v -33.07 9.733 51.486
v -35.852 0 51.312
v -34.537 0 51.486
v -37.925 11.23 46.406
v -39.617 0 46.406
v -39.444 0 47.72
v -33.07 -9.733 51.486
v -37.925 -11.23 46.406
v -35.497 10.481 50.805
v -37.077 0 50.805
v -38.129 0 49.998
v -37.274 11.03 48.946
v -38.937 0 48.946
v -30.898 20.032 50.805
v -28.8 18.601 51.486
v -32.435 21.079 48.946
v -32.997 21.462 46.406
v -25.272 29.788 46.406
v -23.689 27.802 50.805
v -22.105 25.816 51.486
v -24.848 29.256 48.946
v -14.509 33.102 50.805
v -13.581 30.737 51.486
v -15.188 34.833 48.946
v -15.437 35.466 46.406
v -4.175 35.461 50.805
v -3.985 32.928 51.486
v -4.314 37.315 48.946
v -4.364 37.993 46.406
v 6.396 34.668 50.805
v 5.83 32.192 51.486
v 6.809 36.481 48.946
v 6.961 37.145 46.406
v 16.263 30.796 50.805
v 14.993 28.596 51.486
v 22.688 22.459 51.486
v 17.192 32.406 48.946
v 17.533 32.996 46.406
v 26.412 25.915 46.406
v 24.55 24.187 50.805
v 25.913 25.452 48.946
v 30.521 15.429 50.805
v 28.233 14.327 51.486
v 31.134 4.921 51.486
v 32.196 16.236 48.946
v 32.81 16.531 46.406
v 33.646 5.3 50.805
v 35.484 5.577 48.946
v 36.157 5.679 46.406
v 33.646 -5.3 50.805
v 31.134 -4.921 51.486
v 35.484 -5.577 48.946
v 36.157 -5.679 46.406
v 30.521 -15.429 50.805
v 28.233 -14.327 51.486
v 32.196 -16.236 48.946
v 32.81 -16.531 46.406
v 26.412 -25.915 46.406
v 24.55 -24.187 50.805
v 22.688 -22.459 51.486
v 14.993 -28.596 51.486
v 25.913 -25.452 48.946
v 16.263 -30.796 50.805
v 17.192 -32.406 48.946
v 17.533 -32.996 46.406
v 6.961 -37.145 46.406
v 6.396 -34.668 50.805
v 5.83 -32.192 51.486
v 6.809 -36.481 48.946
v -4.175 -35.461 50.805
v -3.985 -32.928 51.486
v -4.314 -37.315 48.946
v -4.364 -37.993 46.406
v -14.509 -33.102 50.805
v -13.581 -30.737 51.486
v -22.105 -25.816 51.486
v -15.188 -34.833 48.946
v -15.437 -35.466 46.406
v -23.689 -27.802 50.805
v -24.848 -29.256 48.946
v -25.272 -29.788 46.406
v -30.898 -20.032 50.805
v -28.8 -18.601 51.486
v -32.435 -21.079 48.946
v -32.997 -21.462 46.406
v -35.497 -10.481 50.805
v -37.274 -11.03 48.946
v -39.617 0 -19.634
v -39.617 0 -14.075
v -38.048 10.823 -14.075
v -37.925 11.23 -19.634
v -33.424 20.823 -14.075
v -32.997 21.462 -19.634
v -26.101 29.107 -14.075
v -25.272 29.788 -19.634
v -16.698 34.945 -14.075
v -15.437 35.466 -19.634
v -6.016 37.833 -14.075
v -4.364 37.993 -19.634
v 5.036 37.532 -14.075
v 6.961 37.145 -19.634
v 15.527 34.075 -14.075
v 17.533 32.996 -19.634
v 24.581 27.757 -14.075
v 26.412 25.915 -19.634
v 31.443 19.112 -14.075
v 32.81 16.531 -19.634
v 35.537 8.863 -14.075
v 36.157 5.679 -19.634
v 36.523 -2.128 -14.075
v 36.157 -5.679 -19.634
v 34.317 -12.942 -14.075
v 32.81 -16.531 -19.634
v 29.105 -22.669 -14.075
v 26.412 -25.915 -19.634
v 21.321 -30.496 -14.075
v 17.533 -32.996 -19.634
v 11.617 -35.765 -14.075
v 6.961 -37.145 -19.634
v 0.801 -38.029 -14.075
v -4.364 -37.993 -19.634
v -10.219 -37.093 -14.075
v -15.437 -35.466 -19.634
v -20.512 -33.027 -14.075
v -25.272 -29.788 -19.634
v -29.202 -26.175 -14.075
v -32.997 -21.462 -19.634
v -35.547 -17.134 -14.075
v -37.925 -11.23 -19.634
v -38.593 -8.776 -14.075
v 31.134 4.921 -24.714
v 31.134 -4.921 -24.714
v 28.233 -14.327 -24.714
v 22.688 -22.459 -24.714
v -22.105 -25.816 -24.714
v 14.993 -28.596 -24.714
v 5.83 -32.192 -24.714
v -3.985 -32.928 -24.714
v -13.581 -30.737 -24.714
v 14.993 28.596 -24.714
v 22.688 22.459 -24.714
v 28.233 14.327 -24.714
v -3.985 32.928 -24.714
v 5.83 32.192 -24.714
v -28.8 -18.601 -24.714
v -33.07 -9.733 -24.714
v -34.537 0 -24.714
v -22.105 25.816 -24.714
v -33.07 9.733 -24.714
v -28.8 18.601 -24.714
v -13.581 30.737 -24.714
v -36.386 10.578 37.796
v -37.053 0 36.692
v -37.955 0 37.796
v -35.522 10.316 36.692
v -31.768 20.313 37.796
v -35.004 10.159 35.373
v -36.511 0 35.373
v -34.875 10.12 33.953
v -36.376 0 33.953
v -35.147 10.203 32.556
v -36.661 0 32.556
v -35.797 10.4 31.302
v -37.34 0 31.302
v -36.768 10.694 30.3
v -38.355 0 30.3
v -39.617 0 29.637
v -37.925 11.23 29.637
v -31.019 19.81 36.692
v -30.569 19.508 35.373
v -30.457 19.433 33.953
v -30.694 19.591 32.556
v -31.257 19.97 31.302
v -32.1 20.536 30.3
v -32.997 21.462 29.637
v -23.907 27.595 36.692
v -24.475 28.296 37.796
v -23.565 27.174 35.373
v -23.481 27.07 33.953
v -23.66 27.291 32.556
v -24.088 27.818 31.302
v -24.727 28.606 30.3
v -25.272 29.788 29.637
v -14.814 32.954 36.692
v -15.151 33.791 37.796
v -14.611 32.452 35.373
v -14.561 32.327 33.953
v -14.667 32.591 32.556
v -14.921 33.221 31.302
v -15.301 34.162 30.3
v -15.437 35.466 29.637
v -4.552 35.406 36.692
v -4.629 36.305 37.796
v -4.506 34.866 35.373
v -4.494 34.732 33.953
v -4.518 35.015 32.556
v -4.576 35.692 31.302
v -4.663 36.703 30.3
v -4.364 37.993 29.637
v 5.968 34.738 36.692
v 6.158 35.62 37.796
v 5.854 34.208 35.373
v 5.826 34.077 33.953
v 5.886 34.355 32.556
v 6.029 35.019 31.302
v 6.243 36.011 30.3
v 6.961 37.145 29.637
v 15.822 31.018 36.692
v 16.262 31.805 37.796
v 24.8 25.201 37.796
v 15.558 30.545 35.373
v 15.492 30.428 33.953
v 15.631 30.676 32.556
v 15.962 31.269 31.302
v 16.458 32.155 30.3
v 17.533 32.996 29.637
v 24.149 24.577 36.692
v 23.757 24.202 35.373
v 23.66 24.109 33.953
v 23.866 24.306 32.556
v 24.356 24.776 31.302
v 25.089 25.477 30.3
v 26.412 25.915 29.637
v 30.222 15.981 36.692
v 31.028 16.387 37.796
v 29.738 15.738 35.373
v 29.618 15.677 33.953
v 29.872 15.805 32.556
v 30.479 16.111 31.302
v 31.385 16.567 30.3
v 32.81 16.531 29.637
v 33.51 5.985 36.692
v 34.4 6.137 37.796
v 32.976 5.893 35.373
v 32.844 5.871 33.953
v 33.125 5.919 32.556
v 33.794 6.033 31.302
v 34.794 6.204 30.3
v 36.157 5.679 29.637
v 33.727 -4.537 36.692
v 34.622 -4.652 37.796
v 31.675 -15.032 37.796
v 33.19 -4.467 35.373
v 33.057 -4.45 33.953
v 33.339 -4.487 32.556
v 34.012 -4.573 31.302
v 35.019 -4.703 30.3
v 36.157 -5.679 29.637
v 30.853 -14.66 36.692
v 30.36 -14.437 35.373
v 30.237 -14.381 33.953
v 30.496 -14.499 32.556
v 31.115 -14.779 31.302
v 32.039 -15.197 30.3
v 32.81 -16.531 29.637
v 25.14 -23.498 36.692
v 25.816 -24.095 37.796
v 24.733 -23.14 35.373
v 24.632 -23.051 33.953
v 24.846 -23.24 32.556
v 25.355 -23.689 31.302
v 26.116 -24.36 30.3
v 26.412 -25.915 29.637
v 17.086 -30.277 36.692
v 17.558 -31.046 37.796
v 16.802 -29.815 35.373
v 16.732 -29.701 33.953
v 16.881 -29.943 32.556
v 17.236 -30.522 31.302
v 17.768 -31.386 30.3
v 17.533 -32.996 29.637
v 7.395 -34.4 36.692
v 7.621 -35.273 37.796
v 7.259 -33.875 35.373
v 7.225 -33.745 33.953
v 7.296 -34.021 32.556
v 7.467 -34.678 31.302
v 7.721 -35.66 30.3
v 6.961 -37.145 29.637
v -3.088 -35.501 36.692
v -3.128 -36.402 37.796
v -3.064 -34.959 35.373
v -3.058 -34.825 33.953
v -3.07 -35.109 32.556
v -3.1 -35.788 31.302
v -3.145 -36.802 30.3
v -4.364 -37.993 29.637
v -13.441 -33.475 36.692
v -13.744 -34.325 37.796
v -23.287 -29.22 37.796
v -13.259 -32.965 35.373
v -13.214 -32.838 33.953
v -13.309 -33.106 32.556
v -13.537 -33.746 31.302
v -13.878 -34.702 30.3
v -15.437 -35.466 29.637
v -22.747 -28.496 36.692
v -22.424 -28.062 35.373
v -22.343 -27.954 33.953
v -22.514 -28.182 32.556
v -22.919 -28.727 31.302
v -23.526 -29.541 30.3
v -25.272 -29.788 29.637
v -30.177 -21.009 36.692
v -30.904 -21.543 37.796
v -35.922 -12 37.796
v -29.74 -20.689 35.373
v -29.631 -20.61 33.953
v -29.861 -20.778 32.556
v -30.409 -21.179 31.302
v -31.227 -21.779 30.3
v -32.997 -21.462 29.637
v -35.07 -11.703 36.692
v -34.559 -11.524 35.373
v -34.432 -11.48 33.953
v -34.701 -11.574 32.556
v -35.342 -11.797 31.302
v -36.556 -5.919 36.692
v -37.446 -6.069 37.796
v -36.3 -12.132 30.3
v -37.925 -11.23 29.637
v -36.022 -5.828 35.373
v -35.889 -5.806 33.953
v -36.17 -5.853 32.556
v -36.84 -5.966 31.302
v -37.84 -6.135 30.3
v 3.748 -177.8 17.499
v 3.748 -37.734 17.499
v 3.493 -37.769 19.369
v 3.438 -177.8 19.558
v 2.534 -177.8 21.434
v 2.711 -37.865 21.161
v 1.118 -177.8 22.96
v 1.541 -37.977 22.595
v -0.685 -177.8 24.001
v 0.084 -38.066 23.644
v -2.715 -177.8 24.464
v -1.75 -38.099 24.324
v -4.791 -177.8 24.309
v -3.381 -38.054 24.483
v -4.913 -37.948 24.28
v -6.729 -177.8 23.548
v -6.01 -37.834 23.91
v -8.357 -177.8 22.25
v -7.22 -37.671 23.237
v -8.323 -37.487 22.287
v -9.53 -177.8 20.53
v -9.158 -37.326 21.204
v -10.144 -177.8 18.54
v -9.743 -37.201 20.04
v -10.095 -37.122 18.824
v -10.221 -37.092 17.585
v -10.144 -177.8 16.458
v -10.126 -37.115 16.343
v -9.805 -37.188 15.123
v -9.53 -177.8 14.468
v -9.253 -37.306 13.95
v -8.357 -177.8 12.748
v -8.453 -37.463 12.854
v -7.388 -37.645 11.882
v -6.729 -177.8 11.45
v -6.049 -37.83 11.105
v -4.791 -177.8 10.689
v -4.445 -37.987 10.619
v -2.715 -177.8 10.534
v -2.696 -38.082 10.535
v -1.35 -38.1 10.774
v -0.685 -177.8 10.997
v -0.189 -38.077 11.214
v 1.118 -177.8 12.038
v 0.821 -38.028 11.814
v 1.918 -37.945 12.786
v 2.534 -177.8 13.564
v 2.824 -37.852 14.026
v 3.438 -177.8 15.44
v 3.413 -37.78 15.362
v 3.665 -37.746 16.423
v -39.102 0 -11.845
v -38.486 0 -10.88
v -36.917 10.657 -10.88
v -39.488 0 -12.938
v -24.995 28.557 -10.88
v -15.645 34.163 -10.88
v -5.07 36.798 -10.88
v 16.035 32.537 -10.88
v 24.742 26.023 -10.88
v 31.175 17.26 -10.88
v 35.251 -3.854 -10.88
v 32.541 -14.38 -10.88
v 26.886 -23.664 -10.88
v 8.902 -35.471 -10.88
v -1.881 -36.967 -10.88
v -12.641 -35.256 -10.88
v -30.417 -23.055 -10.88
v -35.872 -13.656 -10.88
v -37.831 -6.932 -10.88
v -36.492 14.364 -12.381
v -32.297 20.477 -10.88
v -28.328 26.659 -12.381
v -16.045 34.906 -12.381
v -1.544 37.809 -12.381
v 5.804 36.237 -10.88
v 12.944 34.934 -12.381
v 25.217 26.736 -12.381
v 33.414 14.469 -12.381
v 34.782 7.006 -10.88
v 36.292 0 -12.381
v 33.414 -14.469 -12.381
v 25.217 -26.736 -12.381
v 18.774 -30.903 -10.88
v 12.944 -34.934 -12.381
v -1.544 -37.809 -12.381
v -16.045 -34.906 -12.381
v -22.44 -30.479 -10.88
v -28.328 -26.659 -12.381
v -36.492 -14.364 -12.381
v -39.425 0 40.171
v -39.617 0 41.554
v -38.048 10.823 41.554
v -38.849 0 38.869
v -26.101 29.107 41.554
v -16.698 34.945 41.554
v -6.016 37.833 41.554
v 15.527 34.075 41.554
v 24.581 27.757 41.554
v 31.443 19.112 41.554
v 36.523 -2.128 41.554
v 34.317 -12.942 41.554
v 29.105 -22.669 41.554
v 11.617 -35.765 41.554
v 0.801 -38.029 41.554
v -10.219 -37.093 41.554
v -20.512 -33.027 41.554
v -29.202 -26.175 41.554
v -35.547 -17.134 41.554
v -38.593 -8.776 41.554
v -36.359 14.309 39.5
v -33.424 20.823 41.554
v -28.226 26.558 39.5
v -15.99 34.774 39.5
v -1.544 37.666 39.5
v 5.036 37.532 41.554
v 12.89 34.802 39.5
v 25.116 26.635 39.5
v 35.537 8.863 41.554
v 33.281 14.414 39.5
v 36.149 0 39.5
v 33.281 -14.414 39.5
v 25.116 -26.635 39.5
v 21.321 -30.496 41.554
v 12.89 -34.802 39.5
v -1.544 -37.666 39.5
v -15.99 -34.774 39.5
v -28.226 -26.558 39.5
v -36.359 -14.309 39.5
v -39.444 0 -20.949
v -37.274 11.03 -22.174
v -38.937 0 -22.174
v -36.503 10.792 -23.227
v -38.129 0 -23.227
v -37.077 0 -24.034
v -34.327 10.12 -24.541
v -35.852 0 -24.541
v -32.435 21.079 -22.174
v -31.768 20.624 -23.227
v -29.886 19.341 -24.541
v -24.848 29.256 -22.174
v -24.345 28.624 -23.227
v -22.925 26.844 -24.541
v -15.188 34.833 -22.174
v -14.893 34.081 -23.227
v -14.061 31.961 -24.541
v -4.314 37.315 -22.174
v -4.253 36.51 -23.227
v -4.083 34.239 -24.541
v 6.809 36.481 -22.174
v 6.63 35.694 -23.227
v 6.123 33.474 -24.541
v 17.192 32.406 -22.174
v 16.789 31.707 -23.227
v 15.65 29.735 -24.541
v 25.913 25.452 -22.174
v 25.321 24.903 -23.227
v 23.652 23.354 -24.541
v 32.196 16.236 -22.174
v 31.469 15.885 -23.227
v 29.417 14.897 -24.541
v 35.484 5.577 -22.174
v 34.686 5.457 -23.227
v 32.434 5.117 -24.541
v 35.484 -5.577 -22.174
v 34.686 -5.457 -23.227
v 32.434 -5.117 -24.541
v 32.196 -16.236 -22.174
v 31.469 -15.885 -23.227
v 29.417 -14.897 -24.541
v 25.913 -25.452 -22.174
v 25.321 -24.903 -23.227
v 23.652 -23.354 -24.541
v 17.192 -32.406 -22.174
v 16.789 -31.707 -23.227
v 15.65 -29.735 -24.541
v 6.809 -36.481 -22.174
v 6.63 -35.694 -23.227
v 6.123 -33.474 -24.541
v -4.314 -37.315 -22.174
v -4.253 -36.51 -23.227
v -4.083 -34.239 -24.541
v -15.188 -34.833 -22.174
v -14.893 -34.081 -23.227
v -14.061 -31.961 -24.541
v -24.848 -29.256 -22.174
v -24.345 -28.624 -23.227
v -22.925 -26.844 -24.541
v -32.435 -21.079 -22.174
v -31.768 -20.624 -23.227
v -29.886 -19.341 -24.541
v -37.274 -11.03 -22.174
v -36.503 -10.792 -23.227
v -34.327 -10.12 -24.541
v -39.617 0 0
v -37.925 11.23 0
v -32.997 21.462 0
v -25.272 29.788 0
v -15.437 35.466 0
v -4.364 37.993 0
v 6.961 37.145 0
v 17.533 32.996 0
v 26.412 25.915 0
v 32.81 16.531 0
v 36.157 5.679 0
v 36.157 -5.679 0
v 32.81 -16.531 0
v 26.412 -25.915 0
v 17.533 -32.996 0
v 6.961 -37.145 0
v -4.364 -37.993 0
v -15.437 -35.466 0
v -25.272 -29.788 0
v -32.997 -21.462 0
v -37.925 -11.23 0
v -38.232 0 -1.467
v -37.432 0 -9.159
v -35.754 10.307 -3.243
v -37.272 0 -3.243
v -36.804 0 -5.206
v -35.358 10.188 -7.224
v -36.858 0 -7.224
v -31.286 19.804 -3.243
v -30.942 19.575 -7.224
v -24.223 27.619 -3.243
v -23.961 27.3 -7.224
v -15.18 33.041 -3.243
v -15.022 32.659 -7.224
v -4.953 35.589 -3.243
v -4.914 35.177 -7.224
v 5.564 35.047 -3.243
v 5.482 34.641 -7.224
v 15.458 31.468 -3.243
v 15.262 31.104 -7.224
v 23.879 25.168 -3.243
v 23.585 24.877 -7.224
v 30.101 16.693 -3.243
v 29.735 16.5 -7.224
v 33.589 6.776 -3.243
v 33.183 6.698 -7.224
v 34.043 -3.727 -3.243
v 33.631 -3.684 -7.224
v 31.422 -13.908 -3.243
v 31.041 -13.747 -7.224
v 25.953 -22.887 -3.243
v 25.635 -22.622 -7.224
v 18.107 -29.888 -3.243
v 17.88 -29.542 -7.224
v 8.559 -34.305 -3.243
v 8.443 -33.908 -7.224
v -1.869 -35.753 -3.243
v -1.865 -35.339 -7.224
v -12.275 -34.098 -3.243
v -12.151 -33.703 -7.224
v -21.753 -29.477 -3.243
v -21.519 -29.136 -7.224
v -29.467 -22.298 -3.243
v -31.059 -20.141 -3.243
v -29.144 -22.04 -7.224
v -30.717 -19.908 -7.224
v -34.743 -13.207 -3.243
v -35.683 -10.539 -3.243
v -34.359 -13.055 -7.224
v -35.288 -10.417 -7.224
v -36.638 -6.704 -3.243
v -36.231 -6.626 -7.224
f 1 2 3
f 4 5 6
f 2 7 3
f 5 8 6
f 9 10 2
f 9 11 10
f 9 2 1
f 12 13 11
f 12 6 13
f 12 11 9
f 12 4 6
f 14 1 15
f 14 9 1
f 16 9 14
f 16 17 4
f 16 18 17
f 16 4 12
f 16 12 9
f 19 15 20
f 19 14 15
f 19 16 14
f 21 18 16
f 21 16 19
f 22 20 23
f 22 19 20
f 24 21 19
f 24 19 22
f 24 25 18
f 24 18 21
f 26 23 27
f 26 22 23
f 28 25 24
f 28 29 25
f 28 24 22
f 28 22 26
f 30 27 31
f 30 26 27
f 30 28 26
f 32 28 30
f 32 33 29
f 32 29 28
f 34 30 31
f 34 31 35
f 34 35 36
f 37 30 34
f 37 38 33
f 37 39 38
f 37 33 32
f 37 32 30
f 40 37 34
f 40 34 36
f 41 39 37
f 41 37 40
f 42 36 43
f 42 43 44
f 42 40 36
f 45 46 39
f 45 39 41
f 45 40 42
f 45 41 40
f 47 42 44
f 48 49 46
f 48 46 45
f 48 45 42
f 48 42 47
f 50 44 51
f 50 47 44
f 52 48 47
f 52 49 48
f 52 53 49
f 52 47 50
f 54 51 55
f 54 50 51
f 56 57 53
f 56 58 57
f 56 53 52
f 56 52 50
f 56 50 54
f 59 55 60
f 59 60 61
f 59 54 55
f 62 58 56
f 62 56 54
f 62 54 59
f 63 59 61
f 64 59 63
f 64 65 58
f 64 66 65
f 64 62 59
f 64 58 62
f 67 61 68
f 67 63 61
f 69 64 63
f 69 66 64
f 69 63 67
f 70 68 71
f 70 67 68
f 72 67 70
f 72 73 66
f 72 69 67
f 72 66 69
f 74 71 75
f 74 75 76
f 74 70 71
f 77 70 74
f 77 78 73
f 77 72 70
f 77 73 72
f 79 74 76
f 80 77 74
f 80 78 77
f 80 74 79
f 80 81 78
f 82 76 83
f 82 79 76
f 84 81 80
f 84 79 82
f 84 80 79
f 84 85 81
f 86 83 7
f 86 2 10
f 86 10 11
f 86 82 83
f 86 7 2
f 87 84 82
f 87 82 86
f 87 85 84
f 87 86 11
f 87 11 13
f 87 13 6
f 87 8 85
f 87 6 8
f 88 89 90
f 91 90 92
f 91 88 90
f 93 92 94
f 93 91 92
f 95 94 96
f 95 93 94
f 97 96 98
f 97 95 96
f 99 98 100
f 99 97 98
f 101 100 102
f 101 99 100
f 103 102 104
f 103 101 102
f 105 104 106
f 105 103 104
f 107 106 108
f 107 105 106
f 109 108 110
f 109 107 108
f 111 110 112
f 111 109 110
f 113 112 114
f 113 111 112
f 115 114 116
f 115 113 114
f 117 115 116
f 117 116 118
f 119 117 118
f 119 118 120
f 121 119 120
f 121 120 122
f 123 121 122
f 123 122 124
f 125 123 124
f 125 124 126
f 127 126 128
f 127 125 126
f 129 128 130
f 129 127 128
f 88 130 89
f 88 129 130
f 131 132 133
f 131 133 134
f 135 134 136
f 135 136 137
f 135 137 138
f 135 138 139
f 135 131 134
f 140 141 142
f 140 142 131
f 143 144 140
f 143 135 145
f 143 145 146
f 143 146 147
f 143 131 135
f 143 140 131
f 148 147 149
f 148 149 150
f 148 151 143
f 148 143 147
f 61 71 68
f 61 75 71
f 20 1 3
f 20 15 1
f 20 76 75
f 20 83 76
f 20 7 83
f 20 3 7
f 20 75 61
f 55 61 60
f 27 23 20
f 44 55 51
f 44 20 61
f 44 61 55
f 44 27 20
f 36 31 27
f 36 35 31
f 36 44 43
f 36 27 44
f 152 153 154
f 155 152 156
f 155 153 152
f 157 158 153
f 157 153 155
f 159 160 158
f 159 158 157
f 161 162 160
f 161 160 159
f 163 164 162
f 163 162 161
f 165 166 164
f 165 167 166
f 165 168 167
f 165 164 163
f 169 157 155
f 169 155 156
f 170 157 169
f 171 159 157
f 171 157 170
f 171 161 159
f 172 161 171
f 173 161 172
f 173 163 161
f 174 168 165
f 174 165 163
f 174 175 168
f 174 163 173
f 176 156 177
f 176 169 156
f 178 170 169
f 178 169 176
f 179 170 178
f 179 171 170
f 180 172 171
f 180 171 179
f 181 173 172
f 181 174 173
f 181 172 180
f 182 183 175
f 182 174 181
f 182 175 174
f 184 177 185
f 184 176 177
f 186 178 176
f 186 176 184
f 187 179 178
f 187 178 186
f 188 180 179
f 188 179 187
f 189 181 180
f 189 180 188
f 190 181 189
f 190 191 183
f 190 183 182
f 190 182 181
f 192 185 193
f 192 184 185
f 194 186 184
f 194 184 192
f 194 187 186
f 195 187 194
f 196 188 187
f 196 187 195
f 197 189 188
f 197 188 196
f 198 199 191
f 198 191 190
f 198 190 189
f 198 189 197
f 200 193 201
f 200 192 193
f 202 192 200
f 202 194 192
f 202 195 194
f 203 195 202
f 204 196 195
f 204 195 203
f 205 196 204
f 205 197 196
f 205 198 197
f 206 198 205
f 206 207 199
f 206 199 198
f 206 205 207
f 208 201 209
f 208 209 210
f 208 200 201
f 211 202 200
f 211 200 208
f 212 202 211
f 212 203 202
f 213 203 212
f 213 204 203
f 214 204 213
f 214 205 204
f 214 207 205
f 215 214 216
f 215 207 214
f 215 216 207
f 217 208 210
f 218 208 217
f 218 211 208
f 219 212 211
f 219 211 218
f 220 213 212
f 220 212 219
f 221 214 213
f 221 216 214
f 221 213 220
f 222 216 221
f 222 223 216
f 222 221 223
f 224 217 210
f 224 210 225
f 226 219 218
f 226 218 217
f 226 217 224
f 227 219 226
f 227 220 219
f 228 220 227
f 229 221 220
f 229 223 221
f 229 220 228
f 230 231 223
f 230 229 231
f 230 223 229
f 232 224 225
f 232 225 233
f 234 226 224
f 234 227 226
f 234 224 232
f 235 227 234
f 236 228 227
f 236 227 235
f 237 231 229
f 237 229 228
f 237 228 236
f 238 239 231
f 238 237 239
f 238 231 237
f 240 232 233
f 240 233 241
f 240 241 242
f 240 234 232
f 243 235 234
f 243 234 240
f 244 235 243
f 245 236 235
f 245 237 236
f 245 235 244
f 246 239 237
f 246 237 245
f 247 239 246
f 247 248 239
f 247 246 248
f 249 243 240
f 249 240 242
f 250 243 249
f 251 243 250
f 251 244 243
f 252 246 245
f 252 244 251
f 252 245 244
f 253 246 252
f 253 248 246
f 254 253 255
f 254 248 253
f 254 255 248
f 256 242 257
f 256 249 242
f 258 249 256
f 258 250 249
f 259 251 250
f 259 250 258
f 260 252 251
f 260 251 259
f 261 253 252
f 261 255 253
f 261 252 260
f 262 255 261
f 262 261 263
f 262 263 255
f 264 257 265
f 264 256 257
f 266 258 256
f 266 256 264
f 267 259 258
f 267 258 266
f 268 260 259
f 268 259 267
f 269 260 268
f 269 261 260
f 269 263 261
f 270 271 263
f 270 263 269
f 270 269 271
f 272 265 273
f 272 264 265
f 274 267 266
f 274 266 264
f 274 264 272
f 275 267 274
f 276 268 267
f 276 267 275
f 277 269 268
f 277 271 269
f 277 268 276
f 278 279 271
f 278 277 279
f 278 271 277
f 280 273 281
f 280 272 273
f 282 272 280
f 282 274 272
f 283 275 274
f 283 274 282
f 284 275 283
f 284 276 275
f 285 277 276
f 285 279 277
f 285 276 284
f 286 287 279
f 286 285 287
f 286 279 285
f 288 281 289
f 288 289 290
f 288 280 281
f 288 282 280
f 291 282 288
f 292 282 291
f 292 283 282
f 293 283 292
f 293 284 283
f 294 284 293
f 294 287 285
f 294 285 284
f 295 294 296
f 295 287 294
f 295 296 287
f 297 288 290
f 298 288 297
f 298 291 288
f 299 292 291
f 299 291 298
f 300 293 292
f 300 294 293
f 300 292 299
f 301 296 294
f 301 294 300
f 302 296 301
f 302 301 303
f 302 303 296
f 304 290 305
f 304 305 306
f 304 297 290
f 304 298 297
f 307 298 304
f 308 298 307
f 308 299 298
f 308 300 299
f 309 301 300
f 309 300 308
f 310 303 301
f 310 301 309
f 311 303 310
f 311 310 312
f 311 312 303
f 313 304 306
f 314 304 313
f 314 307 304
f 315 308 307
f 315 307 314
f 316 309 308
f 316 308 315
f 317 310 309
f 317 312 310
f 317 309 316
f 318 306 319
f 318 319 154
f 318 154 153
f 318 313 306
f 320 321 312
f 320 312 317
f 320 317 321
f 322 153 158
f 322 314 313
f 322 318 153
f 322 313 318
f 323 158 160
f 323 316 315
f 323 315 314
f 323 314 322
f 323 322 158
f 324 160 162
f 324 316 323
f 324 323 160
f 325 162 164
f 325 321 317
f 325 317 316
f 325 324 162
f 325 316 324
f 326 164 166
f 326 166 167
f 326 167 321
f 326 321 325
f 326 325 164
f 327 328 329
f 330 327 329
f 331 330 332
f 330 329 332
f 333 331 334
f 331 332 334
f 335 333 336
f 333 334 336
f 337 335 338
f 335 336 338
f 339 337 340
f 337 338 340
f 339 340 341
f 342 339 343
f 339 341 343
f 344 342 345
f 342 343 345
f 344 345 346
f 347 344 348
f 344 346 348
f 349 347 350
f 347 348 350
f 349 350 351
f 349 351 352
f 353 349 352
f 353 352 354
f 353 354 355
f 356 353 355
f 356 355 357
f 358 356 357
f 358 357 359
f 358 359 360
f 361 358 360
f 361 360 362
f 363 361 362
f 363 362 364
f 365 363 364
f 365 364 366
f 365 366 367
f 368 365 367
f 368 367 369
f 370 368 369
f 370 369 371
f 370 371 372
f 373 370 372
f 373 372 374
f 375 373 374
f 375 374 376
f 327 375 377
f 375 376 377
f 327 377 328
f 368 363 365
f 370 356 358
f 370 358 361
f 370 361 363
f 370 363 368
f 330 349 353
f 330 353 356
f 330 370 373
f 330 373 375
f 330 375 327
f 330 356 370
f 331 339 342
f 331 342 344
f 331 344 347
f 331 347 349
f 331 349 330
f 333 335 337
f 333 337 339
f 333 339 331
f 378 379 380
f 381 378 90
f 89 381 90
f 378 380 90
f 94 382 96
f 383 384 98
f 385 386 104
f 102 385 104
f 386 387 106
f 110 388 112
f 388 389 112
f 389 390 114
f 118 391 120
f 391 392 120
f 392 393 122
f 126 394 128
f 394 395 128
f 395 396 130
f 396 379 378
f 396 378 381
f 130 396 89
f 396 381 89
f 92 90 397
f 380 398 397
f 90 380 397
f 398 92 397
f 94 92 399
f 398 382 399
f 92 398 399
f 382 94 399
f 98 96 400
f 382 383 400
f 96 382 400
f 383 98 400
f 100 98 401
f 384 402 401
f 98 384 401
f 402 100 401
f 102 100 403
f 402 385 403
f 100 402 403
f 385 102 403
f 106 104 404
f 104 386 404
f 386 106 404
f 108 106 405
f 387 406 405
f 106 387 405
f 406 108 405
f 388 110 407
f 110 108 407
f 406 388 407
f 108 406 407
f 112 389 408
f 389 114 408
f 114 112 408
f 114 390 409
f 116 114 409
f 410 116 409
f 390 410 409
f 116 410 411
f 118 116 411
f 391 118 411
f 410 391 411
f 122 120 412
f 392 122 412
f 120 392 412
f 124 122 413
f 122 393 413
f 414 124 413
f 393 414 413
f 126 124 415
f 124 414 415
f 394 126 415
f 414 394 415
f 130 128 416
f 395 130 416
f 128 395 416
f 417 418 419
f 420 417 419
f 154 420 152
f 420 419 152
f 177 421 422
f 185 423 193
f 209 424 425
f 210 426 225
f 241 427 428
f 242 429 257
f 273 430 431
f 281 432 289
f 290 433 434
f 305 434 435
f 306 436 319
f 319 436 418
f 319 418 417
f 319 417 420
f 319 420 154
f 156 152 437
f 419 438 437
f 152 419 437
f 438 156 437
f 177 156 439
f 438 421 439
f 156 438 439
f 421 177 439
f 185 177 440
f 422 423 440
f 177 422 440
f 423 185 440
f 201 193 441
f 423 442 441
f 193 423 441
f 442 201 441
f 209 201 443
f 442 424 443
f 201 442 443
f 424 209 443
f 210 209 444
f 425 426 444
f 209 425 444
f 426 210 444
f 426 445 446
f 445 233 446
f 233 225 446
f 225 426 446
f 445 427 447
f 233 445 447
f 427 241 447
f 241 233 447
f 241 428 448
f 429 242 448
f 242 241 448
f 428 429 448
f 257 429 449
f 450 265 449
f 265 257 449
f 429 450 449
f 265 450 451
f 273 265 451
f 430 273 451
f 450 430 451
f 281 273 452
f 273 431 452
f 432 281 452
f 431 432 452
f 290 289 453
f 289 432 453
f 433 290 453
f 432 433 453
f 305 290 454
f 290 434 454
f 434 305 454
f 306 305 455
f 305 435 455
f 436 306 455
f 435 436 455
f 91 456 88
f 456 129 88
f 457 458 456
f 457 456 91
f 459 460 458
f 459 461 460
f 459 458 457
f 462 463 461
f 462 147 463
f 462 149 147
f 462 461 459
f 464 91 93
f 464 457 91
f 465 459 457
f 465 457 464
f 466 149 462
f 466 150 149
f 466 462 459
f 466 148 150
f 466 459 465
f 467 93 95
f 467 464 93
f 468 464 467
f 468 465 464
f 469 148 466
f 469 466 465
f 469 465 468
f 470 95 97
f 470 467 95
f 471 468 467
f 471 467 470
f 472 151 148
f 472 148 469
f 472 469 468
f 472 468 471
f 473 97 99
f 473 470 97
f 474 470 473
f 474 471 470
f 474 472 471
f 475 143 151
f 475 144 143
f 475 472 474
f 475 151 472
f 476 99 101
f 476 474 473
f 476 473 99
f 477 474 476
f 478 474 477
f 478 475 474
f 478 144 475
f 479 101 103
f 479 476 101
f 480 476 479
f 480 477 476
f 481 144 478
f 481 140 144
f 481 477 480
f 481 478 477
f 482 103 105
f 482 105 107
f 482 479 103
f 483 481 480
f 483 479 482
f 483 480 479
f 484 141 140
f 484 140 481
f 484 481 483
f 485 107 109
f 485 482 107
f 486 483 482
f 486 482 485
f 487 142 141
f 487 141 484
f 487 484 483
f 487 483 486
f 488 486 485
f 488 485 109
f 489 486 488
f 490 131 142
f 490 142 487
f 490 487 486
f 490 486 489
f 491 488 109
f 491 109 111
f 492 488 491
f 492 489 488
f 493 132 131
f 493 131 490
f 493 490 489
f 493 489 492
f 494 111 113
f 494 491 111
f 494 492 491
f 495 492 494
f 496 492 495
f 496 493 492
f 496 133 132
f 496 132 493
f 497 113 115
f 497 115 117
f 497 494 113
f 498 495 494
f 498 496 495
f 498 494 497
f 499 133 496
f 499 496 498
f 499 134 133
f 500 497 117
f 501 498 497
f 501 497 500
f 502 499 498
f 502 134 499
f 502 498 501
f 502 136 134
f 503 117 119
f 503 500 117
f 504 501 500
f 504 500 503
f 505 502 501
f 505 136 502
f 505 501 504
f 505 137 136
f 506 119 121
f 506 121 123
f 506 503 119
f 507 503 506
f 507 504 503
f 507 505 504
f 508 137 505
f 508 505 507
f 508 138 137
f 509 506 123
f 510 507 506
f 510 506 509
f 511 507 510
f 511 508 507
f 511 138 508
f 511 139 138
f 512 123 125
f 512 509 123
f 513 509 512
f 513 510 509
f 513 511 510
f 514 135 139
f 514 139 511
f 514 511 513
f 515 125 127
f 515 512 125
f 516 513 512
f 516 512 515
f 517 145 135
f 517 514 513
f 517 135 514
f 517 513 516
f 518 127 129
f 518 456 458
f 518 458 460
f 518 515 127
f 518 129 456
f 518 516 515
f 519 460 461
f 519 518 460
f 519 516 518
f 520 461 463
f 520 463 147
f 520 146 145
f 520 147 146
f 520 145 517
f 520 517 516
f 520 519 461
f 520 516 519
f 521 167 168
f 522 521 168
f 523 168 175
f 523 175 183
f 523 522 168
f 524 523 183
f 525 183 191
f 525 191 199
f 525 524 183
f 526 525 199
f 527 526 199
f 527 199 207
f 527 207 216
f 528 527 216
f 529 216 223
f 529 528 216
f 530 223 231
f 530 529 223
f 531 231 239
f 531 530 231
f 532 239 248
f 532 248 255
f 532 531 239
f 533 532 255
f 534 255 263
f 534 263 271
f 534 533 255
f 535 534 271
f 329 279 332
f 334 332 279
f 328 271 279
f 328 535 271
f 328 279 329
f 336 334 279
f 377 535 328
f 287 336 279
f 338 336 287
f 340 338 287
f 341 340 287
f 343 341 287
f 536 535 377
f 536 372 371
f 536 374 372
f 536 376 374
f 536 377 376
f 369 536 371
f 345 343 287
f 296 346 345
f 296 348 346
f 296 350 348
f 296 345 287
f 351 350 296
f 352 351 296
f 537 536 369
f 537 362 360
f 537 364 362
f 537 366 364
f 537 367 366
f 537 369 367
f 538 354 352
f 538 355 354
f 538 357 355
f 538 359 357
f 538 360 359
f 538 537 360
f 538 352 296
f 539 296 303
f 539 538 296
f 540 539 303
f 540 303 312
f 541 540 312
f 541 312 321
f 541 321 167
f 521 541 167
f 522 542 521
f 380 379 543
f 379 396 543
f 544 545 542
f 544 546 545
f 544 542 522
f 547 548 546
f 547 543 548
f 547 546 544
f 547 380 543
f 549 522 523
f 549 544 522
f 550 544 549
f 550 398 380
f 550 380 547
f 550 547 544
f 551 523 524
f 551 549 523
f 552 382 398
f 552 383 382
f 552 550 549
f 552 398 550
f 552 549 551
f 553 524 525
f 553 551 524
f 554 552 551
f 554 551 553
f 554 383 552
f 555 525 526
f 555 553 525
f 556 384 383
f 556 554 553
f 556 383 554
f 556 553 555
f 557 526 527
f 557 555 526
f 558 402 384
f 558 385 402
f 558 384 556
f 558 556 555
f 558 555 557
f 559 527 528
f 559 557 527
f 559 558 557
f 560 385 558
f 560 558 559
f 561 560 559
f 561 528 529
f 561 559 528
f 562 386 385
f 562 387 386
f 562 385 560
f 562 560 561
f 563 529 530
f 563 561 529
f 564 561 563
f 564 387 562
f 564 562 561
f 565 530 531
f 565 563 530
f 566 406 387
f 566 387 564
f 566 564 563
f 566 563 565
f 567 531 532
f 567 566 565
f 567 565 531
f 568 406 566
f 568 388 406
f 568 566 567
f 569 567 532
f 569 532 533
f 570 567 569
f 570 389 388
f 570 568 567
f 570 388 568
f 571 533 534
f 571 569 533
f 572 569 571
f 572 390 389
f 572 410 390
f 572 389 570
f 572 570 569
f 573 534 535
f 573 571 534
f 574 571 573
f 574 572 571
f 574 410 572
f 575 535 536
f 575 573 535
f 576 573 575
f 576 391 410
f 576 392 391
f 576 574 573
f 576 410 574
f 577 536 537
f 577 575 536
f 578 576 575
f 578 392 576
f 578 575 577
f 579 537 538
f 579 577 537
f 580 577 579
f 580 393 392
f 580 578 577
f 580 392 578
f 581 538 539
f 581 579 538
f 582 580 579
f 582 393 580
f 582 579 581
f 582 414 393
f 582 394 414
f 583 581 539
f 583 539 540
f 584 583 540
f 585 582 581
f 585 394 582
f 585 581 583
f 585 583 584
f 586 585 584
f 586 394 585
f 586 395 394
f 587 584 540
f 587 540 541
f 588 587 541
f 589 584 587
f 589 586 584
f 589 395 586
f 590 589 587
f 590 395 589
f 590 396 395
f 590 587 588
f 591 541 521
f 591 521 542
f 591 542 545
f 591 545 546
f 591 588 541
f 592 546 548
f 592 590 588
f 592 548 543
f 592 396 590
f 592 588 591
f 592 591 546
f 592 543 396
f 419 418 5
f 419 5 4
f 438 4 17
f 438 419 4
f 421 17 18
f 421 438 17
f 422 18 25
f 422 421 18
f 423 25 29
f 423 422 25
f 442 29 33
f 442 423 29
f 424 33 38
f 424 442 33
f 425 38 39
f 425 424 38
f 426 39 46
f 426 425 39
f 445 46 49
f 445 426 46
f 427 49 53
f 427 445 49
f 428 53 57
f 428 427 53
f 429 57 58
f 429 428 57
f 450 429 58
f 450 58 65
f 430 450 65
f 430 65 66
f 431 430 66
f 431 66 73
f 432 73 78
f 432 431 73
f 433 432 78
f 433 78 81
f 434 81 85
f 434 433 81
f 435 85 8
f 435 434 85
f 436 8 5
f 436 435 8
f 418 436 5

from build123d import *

# Parameters (mm, degrees)
F2_R     = 5.08
F3_R     = 6.985
F4_DEPTH = 177.8


with BuildPart() as f1:
    # F0 (on Front) → F1 (revolve)
    with BuildSketch(Plane.XZ):
        with BuildLine():
            Line((-1.5172553301, 51.4855757356), (-39.6172553301, 51.4855757356))
            Line((-39.6172553301, 51.4855757356), (-39.6172553301, 38.7855757356))
            ThreePointArc((-39.6172553301, 38.7855757356), (-36.369468827, 34.2113286421), (-39.6172553301, 29.6370815486))
            Line((-39.6172553301, 29.6370815486), (-39.6172553301, 0))
            ThreePointArc((-39.6172553301, 0), (-36.7620250915, -6.0072121322), (-39.6172553301, -12.0144242644))
            Line((-39.6172553301, -12.0144242644), (-39.6172553301, -24.7144242644))
            Line((-39.6172553301, -24.7144242644), (-1.5172553301, -24.7144242644))
            Line((-1.5172553301, -24.7144242644), (-1.5172553301, 51.4855757356))
        make_face()
    revolve(axis=Axis((-1.5172553301, 0, 13.3855757356), (0, 0, -1)))

    # F2
    f2_edges = [f1.edges().sort_by_distance(p)[0] for p in [
        (36.582745, 0, 51.485576),
        (36.582745, 0, 38.785576),
        (-39.617255, 0, 45.135576),
        (36.582745, 0, -12.014424),
        (36.582745, 0, -24.714424),
        (-39.617255, 0, -18.364424),
    ]]
    fillet(f2_edges, radius=F2_R)

    # F3 (on Front) → F4 (join)
    with BuildSketch(Plane.XZ):
        with Locations((-3.2368141692, 17.4990277737)):
            Circle(F3_R)
    extrude(amount=F4_DEPTH)


solid = f1.part
